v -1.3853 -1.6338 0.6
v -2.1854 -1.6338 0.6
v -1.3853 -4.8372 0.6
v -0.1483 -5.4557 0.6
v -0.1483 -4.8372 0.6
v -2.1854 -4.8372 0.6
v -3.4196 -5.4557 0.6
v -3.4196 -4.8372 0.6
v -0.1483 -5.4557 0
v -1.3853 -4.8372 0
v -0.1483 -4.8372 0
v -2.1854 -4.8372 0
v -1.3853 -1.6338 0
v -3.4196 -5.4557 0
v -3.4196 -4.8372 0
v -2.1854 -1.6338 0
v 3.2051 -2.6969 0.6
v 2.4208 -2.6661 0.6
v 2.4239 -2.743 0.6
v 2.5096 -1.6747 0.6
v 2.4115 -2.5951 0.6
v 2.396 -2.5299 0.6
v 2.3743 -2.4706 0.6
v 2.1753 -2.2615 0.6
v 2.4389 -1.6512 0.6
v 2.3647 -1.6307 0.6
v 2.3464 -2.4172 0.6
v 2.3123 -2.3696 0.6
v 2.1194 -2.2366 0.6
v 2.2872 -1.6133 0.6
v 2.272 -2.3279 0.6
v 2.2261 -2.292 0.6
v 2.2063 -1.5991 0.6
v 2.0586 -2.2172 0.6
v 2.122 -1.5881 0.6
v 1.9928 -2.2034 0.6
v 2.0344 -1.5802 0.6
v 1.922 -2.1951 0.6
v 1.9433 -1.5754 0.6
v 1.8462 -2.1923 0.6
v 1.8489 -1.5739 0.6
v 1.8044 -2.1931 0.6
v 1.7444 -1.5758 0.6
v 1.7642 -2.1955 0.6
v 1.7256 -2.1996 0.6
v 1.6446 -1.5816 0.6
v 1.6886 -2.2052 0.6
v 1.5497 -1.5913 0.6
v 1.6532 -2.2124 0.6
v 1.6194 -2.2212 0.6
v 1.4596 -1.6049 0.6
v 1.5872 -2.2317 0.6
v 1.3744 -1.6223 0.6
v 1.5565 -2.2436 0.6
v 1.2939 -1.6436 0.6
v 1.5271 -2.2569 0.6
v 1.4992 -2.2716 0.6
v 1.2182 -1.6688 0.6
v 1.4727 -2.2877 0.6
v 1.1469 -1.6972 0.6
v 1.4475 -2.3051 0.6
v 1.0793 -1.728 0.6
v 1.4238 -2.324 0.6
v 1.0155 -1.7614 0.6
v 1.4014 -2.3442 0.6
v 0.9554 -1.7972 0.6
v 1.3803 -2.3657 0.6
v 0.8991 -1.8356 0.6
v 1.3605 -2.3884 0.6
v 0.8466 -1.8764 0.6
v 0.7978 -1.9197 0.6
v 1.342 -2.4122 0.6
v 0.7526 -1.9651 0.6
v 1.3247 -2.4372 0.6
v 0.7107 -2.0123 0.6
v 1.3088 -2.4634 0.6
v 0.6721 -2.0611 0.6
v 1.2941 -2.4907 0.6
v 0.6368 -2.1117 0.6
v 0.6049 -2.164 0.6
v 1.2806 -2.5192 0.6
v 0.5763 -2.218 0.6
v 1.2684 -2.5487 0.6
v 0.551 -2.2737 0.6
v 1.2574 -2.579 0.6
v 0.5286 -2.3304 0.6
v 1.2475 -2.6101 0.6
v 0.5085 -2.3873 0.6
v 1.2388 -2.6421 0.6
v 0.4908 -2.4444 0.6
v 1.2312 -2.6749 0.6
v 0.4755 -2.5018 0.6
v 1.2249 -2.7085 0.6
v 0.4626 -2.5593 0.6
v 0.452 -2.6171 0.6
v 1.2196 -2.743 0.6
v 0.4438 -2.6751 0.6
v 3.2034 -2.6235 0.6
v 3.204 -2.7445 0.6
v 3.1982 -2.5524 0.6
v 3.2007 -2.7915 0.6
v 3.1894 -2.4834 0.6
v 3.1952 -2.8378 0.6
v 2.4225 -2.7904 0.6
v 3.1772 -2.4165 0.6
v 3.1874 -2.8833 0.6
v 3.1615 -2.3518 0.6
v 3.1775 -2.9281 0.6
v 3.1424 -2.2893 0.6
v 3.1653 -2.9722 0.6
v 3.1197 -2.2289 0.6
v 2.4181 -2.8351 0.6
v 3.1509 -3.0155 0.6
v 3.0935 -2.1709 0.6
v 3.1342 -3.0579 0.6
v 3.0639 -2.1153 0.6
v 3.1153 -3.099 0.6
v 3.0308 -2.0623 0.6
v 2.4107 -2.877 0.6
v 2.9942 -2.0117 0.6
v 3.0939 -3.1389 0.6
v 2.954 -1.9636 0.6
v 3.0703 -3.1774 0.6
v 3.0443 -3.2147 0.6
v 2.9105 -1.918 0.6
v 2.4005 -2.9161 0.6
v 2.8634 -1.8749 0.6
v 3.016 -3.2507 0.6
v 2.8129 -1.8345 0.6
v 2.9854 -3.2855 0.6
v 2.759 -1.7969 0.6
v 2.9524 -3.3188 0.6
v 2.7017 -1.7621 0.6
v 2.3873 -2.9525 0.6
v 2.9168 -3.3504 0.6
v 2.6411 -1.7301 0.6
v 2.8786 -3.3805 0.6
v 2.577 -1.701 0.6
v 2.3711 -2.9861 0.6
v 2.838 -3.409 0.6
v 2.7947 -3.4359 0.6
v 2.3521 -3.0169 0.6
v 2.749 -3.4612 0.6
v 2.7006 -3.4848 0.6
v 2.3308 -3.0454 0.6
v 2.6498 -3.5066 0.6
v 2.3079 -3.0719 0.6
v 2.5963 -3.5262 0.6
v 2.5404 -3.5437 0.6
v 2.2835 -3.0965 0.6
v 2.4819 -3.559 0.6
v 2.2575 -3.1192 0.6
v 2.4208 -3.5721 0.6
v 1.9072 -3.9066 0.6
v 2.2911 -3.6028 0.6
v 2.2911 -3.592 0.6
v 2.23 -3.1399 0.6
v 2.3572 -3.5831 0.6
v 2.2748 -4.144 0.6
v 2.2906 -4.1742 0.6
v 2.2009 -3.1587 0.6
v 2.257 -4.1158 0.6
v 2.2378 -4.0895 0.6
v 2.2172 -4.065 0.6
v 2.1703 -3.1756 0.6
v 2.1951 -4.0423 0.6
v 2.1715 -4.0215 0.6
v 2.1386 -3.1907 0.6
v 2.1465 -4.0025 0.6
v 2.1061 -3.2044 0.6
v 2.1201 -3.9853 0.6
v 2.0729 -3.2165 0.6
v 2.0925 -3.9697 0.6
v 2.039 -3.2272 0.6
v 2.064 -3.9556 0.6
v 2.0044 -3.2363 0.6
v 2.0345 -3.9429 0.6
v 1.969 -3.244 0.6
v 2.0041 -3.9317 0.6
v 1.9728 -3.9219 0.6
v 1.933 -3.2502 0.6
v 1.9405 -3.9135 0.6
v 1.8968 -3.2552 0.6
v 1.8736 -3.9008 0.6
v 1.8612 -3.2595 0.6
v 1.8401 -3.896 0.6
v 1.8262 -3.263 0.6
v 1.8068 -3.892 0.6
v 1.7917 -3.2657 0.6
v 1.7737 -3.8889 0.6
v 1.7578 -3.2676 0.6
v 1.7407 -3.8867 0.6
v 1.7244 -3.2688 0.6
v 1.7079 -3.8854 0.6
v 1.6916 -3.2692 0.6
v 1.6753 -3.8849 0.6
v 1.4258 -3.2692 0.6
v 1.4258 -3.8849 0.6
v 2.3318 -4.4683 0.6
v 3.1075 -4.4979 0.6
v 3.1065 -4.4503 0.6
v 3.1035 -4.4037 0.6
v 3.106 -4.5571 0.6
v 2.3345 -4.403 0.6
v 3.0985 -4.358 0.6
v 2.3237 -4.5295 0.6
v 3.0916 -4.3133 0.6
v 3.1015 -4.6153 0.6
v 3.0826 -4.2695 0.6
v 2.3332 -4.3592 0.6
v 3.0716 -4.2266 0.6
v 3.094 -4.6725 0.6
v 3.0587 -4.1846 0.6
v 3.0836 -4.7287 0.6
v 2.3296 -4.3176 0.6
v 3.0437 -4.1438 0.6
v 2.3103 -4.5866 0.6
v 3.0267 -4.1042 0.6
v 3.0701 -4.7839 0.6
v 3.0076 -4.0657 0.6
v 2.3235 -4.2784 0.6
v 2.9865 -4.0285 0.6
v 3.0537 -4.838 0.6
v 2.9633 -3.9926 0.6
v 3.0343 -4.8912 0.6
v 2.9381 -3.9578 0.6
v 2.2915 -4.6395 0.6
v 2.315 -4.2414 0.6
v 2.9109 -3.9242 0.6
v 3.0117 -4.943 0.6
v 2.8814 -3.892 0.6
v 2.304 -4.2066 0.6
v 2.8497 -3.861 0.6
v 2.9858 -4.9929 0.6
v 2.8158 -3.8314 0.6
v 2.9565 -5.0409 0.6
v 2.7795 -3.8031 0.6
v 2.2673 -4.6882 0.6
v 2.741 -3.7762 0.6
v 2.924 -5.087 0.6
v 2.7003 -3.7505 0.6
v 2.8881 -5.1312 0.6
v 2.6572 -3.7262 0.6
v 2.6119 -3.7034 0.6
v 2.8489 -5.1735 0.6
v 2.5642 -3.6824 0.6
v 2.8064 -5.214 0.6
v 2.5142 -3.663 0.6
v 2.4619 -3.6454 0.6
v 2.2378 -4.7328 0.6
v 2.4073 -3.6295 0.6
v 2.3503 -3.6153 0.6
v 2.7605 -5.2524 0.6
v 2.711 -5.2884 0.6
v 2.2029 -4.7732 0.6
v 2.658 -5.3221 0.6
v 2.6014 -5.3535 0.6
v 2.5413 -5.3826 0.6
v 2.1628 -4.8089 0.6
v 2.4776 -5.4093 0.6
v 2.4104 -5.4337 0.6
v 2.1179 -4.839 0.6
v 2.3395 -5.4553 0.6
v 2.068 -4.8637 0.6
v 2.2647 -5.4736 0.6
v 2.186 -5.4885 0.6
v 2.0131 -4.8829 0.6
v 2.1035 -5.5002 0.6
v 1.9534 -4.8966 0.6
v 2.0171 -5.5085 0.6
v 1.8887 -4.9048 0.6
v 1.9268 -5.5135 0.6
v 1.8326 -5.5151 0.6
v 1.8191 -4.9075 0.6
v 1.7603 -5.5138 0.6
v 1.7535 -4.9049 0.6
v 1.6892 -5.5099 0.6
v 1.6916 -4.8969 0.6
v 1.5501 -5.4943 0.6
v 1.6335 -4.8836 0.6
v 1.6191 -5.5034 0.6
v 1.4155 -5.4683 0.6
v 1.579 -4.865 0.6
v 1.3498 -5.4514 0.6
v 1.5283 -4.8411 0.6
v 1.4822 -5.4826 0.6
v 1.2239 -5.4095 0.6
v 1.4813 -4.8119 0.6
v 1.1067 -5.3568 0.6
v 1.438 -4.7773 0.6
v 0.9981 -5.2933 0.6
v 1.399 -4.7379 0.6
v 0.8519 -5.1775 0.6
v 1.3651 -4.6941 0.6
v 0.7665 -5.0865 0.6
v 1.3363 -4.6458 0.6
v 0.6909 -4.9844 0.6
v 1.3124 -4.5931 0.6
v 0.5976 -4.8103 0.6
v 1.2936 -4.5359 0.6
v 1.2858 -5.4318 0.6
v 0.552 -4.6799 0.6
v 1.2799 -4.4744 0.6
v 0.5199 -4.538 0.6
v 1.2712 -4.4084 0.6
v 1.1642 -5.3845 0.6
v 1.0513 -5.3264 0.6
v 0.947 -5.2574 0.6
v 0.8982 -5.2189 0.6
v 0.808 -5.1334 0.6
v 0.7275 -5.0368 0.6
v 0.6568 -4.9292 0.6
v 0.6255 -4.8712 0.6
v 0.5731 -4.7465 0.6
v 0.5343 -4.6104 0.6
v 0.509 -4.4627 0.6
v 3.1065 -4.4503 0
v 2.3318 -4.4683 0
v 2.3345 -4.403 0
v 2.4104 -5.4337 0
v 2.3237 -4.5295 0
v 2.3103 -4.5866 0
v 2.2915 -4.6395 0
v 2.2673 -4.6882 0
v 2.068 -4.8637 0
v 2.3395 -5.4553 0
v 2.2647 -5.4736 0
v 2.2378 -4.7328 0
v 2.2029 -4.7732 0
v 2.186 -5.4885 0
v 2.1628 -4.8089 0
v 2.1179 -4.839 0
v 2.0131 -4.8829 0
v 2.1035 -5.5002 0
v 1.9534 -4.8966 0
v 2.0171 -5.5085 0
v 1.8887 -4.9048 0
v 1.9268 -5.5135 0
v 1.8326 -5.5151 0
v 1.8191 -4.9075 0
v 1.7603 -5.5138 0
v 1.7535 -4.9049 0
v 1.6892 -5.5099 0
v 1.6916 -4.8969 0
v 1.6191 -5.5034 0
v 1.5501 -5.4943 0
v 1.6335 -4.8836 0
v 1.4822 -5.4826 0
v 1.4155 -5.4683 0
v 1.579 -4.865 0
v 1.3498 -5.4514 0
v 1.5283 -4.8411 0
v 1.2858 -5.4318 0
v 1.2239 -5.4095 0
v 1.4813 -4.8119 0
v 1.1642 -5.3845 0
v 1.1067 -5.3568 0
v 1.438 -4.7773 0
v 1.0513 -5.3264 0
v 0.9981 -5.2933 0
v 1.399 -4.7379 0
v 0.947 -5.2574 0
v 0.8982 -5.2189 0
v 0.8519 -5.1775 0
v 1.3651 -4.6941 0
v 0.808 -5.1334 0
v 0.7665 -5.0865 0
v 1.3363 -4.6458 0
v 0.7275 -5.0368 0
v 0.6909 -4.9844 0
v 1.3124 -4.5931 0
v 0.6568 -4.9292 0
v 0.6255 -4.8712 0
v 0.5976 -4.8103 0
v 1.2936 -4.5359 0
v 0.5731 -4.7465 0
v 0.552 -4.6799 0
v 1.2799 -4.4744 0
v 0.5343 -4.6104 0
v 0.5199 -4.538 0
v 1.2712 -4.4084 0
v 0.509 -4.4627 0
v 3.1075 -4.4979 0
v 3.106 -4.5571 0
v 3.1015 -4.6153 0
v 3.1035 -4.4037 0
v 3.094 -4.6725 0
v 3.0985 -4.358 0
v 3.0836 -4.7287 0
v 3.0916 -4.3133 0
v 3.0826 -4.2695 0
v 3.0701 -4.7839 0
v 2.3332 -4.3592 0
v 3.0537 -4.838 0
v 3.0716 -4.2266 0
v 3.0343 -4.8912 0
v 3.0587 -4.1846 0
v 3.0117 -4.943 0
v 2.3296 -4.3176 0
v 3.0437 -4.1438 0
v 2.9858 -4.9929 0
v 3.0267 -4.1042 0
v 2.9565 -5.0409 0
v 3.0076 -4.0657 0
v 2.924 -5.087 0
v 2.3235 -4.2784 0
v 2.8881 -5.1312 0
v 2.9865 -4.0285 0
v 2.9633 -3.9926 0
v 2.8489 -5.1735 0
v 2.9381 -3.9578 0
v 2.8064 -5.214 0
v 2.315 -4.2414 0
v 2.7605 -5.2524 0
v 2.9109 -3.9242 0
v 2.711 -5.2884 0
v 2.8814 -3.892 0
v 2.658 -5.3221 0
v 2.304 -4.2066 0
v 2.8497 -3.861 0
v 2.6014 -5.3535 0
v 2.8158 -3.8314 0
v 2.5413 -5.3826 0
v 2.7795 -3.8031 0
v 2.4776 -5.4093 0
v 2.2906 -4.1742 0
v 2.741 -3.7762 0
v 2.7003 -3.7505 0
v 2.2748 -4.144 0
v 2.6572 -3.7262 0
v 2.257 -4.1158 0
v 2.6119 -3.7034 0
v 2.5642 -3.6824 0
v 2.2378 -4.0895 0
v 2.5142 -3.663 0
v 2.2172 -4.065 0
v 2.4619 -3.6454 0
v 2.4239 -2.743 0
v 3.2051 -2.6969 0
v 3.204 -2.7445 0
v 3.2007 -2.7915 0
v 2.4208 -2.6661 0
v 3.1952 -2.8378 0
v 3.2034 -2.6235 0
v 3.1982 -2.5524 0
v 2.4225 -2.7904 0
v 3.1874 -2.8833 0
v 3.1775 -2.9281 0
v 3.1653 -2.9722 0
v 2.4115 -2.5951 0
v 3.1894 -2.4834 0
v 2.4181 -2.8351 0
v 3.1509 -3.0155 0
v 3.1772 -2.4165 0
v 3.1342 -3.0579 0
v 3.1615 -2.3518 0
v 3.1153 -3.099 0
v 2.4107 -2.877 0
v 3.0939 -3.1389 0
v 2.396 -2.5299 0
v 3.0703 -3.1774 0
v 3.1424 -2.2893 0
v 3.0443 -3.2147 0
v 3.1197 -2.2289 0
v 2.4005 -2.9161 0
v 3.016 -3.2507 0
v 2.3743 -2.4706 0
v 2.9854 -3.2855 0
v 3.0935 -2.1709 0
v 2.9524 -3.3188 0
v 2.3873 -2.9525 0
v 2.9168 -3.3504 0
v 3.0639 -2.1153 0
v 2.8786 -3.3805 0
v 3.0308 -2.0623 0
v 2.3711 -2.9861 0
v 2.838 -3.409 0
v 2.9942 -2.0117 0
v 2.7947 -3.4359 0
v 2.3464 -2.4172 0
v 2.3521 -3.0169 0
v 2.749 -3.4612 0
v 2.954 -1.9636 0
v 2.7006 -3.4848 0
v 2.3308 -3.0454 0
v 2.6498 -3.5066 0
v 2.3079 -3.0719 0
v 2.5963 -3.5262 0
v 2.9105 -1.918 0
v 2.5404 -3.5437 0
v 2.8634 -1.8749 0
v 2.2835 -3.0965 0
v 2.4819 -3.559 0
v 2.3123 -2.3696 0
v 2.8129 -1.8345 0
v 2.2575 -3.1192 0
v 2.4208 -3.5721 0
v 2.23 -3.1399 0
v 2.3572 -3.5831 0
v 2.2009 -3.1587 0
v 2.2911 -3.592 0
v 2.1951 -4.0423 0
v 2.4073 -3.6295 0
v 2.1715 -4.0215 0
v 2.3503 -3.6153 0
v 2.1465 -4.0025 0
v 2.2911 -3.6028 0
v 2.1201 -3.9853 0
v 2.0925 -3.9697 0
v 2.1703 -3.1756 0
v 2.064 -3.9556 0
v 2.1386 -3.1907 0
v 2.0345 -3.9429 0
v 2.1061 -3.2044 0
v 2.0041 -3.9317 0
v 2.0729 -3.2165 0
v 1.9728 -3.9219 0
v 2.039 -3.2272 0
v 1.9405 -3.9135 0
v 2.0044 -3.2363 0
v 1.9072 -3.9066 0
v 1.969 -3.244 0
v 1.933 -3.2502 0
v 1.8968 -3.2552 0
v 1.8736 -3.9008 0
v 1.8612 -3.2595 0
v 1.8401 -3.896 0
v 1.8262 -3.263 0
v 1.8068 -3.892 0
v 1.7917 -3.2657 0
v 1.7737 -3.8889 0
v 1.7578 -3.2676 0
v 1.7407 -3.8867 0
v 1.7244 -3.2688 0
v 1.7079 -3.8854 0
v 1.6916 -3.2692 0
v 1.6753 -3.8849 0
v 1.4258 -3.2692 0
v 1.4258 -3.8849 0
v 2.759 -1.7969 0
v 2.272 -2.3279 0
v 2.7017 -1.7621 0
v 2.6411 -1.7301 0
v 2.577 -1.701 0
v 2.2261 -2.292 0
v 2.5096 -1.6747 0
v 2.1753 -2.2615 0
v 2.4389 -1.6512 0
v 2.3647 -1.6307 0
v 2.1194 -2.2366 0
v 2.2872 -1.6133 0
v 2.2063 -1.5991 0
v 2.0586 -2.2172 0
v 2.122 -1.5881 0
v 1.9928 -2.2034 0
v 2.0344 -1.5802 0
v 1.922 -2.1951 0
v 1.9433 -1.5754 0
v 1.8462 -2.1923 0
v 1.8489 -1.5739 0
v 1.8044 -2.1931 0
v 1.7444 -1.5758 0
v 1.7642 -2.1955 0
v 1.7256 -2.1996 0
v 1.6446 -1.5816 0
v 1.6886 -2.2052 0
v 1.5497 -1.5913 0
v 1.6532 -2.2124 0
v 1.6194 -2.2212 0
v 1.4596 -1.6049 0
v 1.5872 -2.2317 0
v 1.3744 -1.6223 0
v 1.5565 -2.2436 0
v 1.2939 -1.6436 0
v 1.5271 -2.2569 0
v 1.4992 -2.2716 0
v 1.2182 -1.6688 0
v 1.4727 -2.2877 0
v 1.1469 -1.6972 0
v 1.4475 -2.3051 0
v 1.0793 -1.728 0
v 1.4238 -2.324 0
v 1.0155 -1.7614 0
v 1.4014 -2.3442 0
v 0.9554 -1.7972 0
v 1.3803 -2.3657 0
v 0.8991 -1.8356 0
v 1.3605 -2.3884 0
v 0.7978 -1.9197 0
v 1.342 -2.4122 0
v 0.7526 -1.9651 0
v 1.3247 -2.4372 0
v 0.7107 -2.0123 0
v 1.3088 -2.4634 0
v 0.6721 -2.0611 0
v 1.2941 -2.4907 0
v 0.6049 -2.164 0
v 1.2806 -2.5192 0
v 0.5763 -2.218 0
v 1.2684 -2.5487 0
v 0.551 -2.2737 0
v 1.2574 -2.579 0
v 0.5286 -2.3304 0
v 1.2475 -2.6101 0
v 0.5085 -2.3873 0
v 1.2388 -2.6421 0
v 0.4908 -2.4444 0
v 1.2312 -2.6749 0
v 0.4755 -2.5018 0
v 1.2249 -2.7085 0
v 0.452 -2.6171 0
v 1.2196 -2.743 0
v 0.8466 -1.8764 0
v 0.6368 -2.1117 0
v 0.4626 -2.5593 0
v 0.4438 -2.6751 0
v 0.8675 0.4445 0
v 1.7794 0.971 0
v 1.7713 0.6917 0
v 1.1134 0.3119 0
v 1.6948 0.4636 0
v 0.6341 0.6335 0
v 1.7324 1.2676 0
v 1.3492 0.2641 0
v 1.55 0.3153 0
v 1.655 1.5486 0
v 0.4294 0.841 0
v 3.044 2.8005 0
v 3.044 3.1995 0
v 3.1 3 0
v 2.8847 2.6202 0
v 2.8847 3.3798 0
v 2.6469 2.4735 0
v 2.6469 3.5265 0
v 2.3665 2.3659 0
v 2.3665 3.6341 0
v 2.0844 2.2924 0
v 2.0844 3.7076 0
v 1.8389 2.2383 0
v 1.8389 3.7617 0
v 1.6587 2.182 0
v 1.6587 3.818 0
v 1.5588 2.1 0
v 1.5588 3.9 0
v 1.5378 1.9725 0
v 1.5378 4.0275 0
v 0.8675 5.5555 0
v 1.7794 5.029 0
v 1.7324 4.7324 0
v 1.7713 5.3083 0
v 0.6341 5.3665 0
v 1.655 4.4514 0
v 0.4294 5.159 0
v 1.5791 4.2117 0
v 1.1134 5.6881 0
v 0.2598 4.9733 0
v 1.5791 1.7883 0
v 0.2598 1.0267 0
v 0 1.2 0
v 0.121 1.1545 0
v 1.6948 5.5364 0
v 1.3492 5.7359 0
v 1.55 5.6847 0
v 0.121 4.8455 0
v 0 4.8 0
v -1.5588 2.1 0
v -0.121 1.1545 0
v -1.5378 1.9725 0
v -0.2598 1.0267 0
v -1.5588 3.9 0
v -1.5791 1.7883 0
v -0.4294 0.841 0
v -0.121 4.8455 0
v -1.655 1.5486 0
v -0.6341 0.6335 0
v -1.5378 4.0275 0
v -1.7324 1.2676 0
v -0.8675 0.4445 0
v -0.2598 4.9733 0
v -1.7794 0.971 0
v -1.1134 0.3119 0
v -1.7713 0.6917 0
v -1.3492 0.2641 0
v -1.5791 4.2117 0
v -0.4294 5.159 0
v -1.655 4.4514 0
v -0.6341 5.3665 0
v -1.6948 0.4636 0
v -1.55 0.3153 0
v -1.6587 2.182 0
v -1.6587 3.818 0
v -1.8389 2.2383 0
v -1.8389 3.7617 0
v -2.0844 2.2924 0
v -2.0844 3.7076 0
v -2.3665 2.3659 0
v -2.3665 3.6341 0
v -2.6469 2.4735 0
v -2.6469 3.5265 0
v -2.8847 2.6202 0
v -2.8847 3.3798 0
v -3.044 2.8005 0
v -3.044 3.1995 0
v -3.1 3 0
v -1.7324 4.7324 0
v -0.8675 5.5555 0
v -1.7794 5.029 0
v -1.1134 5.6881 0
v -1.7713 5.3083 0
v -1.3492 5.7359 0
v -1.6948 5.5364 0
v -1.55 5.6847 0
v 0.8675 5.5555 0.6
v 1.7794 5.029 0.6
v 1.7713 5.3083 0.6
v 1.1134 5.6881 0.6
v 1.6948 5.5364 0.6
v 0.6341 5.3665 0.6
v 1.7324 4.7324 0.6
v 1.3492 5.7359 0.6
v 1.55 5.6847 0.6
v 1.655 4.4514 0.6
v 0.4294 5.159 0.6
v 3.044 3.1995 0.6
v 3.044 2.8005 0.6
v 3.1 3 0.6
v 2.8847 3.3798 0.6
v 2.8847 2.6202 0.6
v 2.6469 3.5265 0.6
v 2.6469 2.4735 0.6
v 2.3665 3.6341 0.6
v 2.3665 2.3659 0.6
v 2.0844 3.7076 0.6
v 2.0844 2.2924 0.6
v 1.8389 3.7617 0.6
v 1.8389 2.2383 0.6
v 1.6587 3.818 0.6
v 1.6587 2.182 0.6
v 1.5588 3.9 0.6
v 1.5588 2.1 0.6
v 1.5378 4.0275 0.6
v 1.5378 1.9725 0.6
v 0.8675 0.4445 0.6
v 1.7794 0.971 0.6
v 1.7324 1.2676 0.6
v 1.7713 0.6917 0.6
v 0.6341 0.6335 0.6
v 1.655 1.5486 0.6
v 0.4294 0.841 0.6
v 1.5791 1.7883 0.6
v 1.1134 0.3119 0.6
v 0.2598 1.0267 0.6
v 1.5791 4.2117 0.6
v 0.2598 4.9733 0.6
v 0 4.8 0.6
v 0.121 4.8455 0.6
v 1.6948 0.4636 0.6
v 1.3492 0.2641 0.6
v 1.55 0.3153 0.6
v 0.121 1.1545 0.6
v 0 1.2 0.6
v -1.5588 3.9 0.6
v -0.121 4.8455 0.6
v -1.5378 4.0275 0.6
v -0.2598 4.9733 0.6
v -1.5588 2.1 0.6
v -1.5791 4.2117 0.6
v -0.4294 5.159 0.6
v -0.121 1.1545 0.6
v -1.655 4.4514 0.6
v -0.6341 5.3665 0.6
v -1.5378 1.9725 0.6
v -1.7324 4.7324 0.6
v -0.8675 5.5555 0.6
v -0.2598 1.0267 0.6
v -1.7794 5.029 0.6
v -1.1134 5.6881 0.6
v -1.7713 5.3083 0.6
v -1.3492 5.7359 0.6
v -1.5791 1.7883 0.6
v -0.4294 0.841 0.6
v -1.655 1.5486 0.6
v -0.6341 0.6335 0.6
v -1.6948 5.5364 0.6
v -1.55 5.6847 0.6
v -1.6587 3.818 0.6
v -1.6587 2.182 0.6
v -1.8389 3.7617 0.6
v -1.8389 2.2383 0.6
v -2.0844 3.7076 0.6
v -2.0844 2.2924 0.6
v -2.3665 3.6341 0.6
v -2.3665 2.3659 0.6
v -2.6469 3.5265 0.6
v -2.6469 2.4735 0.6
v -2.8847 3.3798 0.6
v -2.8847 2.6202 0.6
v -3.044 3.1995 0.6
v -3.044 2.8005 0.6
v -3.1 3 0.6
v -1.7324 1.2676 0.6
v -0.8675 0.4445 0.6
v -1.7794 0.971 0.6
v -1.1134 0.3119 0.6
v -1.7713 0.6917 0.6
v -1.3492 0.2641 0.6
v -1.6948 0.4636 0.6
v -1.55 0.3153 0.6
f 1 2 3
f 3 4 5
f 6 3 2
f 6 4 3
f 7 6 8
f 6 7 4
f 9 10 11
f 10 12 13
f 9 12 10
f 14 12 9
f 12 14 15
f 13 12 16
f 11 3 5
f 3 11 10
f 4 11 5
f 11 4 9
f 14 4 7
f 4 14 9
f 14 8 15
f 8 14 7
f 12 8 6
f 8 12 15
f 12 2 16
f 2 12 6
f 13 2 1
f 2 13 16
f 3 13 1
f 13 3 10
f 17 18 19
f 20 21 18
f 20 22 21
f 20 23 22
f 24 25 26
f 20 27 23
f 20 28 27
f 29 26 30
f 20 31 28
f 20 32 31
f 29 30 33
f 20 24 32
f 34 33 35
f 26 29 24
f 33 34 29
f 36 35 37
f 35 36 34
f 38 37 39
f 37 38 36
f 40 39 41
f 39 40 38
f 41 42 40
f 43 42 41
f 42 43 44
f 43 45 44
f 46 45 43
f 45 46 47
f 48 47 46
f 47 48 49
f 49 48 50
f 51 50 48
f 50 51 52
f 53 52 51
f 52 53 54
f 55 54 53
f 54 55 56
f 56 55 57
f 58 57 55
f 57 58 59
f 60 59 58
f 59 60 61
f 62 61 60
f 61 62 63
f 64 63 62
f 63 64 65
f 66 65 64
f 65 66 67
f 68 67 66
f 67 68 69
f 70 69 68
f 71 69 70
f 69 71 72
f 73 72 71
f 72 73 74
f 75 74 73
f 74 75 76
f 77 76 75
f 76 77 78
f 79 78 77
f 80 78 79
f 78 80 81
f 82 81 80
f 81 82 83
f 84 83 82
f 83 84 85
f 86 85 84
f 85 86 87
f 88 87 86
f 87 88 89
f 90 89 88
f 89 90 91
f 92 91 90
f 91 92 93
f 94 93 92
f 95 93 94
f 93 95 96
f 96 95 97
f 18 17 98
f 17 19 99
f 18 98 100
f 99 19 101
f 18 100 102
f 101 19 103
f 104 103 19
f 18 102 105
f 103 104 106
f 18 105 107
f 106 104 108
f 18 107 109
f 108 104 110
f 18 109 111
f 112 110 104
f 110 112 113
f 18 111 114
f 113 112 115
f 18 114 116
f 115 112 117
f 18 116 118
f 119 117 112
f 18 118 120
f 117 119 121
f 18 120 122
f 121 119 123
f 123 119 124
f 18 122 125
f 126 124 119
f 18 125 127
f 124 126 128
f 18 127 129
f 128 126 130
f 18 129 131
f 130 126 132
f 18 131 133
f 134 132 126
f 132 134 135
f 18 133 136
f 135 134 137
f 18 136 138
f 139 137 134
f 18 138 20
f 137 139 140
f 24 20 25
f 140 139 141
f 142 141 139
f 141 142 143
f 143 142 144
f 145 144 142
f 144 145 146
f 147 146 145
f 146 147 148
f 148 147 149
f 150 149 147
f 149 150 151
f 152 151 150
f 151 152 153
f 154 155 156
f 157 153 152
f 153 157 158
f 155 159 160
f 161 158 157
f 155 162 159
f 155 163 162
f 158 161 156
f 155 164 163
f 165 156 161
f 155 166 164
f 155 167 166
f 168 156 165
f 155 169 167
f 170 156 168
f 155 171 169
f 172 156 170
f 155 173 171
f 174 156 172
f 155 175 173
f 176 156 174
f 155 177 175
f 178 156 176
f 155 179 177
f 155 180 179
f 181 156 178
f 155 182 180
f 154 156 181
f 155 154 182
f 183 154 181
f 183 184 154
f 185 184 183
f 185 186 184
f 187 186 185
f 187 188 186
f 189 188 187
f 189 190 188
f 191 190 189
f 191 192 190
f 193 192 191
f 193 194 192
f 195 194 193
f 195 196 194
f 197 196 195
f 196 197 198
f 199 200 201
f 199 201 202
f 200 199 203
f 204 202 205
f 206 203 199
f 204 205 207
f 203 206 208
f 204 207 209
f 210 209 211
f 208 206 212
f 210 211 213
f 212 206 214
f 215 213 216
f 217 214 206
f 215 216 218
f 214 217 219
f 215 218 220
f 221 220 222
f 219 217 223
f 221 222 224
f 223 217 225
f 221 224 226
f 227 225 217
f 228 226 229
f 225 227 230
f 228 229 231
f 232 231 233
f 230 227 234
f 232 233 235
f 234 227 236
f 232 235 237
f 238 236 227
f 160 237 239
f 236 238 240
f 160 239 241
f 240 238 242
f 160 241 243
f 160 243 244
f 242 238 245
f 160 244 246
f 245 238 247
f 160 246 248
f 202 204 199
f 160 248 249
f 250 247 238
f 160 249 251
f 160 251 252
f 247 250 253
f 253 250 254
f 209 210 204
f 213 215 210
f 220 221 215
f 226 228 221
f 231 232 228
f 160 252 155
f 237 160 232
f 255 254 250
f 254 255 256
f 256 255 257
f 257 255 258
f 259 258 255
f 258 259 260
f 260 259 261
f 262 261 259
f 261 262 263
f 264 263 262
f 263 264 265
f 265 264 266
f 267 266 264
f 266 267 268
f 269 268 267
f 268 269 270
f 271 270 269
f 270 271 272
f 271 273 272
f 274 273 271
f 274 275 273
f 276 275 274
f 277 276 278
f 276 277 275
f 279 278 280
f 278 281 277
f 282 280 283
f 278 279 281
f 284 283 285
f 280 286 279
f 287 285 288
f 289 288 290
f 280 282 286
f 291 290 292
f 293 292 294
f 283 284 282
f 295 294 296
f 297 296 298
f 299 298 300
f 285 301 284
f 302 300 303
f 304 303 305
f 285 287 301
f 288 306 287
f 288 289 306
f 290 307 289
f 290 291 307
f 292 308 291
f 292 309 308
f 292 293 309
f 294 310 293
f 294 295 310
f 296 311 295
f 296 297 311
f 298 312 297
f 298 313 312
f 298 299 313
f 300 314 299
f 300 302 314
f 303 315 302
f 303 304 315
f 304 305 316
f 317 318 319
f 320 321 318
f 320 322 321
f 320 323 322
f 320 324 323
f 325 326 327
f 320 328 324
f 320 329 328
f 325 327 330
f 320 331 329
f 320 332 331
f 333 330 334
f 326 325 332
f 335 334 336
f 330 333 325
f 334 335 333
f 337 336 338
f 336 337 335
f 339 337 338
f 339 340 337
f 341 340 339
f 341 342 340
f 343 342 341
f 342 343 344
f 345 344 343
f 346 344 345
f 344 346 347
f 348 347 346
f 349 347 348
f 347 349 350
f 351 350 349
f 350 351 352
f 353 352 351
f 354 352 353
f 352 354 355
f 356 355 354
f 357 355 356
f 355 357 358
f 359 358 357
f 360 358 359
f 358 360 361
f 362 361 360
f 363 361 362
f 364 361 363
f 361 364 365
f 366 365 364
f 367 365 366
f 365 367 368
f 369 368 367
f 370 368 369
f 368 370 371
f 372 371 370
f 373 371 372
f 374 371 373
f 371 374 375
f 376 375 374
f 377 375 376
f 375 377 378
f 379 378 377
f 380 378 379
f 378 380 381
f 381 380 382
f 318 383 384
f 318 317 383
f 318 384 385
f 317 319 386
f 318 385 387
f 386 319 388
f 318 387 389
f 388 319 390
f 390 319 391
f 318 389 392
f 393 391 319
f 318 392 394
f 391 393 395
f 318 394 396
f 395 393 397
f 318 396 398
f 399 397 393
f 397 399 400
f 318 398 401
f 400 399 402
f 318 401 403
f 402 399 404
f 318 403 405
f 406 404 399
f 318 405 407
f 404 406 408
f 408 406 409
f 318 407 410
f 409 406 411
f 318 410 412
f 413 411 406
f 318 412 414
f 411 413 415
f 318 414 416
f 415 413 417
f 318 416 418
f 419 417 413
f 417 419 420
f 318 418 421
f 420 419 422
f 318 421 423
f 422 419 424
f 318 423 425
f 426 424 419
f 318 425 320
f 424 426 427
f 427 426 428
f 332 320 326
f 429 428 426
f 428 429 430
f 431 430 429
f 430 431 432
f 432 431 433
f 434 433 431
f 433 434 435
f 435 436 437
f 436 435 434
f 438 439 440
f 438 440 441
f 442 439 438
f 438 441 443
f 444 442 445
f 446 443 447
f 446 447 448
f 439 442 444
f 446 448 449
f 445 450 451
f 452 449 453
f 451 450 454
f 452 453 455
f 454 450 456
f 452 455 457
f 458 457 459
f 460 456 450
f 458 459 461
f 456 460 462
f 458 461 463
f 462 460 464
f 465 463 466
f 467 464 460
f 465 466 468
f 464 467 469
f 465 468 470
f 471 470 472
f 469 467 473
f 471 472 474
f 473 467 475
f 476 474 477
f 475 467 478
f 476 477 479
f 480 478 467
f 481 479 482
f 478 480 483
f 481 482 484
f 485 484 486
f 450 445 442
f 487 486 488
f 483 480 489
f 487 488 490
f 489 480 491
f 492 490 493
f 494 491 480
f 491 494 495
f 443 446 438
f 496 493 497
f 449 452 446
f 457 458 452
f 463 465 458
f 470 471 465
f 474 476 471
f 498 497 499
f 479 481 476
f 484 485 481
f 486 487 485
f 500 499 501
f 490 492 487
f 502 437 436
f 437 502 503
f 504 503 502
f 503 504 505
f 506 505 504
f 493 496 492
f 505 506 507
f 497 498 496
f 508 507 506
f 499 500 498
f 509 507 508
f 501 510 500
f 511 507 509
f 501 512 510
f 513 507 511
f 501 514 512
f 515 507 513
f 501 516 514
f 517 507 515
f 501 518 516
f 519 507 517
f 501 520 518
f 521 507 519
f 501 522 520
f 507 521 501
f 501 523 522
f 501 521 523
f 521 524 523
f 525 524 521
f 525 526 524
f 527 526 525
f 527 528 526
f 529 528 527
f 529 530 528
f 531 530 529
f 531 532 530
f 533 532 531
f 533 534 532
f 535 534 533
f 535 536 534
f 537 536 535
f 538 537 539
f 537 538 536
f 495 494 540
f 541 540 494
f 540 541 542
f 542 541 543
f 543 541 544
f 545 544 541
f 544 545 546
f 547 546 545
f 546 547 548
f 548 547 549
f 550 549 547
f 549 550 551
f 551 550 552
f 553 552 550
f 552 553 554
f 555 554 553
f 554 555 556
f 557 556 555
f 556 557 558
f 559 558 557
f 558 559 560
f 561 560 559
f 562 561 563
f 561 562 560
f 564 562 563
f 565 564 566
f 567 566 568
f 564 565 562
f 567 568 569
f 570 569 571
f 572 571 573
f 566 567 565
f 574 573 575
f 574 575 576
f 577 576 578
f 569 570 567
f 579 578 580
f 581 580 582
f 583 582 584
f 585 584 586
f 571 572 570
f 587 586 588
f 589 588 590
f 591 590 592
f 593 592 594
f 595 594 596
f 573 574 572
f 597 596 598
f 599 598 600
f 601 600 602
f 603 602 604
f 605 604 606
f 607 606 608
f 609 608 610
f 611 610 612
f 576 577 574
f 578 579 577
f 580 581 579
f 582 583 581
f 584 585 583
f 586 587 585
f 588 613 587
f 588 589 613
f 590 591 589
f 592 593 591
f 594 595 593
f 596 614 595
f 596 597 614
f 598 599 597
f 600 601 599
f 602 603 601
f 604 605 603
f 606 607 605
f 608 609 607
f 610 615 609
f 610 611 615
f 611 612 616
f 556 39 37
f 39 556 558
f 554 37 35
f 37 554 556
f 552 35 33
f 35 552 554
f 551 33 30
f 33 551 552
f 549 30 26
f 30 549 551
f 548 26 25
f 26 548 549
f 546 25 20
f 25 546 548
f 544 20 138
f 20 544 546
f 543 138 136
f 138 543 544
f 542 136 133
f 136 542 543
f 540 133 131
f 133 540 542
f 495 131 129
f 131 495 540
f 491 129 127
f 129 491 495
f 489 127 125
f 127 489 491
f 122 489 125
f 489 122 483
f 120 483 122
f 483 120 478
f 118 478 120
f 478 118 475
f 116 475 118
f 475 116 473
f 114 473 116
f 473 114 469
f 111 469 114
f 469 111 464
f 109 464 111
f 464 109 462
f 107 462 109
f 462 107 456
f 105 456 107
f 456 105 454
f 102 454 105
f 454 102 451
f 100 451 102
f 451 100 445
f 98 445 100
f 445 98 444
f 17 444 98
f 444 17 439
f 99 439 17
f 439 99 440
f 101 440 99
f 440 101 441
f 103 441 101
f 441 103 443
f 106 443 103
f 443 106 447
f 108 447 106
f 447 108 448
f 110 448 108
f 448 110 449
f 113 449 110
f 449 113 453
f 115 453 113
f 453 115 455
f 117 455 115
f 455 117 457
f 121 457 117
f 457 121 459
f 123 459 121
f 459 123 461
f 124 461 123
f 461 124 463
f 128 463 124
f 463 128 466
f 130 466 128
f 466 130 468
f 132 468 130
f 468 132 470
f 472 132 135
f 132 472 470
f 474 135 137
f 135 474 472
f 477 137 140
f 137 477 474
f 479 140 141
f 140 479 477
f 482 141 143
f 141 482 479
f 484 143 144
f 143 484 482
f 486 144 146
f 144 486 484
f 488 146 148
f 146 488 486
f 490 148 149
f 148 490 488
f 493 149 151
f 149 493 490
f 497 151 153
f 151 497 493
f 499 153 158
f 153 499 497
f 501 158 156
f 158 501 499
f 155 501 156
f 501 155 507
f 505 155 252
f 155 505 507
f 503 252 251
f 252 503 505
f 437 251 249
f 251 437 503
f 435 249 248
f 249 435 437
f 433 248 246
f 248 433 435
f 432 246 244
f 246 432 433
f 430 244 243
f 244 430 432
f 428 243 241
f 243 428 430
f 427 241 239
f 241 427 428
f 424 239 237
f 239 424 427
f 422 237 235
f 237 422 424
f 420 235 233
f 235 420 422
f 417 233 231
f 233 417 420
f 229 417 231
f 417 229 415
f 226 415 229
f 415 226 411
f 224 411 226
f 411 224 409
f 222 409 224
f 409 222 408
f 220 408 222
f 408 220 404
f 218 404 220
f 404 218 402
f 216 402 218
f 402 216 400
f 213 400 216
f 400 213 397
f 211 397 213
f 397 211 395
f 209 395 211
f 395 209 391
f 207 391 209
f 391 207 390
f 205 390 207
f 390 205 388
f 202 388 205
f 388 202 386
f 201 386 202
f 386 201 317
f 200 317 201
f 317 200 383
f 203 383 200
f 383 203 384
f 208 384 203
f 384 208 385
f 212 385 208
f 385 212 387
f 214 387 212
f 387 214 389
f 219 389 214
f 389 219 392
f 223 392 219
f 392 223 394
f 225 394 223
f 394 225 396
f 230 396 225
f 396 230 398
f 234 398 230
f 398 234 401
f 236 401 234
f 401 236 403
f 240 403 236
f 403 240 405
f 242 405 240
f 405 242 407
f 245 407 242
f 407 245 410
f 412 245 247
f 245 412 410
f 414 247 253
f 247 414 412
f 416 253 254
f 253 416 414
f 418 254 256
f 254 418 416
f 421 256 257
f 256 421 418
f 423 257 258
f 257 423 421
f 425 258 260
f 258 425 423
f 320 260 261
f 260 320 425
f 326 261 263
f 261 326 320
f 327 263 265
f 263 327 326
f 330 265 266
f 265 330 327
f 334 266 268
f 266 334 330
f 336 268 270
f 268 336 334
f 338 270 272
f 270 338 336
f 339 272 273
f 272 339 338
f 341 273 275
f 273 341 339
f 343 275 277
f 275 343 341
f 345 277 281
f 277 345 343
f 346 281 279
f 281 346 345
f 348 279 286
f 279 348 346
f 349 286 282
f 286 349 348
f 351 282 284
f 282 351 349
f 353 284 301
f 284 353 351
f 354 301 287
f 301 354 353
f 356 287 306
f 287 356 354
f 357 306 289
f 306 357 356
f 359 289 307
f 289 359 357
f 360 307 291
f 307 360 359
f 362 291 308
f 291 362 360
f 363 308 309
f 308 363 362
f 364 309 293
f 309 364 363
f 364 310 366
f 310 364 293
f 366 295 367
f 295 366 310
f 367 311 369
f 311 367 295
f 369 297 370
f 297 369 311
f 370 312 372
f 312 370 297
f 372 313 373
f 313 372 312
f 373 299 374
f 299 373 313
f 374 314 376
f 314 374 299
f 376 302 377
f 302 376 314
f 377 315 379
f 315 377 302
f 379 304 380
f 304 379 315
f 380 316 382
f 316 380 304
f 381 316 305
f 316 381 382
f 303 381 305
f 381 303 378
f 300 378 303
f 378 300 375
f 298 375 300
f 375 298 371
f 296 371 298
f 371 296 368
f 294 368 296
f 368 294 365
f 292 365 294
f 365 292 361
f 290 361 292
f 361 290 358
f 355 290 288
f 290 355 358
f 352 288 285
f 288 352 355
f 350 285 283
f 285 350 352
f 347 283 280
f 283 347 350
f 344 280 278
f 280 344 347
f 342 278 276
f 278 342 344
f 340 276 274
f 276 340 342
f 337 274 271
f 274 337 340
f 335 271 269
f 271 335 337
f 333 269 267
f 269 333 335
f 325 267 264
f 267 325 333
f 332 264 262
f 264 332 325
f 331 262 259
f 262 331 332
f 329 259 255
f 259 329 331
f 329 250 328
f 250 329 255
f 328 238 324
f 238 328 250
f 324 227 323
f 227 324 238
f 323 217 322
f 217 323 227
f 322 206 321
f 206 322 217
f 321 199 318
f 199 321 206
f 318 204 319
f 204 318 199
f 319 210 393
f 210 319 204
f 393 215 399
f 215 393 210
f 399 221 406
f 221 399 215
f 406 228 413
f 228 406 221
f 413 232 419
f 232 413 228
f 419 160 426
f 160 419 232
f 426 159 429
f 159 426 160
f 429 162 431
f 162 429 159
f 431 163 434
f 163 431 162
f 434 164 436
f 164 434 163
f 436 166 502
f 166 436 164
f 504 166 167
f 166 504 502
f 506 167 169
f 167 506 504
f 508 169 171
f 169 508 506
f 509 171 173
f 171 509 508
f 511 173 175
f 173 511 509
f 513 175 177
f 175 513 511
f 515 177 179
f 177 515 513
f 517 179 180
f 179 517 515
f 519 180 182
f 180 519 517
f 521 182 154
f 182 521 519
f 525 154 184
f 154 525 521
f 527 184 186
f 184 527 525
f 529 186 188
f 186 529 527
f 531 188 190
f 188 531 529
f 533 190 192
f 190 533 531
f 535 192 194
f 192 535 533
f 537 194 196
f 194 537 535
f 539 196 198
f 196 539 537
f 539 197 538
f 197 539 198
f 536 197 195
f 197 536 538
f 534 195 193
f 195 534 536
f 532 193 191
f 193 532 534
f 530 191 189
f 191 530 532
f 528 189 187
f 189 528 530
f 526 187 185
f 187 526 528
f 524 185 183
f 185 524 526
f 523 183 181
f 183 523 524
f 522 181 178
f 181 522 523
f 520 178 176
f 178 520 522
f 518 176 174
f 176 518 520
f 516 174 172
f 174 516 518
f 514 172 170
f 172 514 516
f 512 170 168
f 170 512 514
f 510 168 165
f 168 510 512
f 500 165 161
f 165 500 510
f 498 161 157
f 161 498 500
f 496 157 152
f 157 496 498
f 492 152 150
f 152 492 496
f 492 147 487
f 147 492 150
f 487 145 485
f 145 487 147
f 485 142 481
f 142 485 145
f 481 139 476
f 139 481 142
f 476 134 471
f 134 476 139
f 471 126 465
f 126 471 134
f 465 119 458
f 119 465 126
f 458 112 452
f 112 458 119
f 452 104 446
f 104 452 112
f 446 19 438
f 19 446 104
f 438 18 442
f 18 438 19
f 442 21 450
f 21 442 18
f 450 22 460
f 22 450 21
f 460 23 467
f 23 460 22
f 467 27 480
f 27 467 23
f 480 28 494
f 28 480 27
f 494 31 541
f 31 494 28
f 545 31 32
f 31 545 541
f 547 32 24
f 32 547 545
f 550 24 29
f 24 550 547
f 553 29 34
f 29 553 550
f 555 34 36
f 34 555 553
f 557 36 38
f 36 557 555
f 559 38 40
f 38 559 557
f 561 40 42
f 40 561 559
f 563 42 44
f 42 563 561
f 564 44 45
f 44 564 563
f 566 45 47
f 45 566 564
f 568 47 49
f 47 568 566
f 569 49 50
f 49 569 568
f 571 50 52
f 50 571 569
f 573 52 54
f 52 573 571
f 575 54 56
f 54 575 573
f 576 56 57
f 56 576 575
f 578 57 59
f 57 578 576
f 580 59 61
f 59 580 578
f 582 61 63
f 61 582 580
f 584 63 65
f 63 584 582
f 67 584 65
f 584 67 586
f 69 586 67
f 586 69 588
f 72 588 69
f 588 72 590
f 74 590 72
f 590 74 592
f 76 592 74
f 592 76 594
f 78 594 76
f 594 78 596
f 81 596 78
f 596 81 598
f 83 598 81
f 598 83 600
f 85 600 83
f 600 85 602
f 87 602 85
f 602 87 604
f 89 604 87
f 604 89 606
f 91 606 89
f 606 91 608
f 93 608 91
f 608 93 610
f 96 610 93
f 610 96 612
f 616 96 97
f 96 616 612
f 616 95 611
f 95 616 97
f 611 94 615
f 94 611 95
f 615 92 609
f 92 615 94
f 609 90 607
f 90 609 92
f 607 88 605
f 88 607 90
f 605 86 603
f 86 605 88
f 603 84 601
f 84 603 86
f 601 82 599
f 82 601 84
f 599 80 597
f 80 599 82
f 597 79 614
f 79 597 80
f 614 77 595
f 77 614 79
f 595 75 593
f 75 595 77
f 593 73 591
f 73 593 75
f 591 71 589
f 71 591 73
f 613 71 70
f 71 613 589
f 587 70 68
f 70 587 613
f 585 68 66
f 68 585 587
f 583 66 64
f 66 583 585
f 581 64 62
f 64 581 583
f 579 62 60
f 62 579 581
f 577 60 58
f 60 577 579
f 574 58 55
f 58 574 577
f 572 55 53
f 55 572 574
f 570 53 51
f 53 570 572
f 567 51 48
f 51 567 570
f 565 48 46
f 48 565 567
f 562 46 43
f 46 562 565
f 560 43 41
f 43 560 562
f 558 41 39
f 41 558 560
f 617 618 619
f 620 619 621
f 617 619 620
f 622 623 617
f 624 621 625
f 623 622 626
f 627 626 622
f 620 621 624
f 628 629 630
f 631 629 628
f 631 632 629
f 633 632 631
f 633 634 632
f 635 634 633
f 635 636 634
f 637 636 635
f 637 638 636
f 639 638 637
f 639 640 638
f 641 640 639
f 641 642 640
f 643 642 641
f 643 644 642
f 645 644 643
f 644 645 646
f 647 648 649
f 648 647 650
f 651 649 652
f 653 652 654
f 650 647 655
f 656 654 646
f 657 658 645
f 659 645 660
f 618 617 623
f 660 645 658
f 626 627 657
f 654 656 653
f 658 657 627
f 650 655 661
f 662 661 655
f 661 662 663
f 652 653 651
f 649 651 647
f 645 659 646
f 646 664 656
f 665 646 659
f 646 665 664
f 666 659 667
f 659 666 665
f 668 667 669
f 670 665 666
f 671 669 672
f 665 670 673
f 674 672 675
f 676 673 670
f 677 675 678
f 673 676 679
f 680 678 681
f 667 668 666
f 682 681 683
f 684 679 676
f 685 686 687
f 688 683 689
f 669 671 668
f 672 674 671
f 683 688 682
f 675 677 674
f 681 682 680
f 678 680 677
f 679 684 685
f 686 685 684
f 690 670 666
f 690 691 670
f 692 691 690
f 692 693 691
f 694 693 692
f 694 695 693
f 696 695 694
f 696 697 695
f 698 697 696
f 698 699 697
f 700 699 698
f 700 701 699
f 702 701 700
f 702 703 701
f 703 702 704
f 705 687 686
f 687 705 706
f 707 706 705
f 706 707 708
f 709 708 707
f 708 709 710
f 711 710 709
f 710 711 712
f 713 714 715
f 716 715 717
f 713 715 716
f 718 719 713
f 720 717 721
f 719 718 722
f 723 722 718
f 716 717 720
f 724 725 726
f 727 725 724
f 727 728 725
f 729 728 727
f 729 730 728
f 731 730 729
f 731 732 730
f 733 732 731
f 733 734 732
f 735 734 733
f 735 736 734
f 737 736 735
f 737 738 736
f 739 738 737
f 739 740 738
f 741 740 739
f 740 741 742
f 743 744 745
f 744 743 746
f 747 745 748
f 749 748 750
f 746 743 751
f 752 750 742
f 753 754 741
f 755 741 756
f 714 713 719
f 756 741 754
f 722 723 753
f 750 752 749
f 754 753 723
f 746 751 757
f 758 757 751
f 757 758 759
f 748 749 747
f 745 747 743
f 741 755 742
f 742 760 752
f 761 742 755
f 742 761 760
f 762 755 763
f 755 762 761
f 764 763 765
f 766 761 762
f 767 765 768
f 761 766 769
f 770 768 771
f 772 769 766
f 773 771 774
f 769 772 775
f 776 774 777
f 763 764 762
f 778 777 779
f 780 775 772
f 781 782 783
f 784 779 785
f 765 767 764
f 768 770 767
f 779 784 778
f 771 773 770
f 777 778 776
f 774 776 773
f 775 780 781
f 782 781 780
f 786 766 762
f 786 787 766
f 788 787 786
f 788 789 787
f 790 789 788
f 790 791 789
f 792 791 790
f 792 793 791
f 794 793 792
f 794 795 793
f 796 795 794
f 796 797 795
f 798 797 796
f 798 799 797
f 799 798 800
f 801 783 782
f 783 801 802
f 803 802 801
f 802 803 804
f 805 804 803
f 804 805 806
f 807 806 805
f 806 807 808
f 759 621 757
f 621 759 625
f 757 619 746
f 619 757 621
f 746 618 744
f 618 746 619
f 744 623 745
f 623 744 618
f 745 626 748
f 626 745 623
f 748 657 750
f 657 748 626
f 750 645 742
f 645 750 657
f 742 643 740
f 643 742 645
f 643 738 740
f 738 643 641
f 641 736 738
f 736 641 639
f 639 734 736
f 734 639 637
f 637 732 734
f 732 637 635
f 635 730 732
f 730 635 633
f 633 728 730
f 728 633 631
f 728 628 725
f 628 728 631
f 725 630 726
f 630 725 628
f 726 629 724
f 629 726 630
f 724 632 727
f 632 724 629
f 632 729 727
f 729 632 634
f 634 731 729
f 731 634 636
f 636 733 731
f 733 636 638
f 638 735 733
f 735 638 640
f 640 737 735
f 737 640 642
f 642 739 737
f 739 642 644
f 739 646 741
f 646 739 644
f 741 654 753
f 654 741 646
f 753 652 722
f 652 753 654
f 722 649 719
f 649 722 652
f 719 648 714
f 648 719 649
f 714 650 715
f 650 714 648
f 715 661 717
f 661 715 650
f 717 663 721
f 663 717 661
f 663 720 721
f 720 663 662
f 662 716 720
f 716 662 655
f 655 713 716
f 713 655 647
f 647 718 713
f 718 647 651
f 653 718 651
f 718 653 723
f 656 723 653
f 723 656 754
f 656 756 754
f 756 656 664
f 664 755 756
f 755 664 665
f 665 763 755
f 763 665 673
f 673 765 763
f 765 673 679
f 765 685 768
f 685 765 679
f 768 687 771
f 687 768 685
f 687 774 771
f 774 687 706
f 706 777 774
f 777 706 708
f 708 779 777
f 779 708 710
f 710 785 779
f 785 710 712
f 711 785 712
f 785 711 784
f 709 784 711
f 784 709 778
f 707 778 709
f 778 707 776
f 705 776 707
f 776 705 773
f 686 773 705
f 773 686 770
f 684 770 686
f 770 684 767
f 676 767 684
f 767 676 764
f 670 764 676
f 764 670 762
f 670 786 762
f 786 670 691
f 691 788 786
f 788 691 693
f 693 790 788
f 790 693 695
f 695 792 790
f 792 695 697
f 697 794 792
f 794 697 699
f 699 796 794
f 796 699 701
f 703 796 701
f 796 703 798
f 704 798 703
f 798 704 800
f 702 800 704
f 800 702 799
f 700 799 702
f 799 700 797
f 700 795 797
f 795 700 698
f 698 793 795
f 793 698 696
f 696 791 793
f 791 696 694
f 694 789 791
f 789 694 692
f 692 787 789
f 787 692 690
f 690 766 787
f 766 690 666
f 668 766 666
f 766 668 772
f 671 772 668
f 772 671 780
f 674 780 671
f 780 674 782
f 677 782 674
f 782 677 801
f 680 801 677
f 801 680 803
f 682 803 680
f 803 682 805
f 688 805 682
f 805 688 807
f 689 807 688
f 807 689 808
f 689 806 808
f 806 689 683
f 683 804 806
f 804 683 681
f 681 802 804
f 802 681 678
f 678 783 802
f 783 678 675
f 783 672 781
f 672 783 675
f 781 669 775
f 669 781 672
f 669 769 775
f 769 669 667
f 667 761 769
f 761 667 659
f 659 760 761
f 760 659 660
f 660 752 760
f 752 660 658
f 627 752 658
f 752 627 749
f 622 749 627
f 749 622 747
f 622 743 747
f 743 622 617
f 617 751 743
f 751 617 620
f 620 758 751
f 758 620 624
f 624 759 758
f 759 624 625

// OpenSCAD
$fn = 50;

difference() {
	union() {
		translate(v = [-1.825, -3.5, 0.6]) {
			rotate(a = [180, 0, 0]) {
				linear_extrude(height = 0.6) {
					text(font = "Liberation Sans:style=Bold", halign = "center", size = 4.0, text = "T", valign = "center");
				}
			}
		}
		translate(v = [1.825, -3.5, 0.6]) {
			rotate(a = [180, 0, 0]) {
				linear_extrude(height = 0.6) {
					text(font = "Liberation Sans:style=Bold", halign = "center", size = 4.0, text = "3", valign = "center");
				}
			}
		}
		translate(v = [0, 3, 0]) {
			linear_extrude(height = 0.6) {
				polygon(points = [[3.1, 0.0], [3.0439902950186117, 0.1995136647114984], [2.8847272103883213, 0.3797815421059436], [2.646888617374527, 0.5264988810722369], [2.3665182744082176, 0.6341066605011758], [2.0844354103556904, 0.7075704773708675], [1.8388718910678303, 0.761685676746956], [1.658746676795018, 0.818003336606089], [1.55884572681199, 0.9], [1.5377850082788151, 1.0275150922444565], [1.5790750912955211, 1.211666933596394], [1.6549917135488983, 1.4513887792304347], [1.7324116139070416, 1.7324116139070416], [1.779405714759903, 2.0290233430980913], [1.7712640685463372, 2.3083562761315313], [1.6947790495515949, 2.5364160920036563], [1.5500000000000005, 2.68467875173176], [1.3492112454670173, 2.735929756715155], [1.1134631418419842, 2.688137818237475], [0.8674829026146248, 2.555522224170328], [0.6341066605011758, 2.3665182744082176], [0.42944369680679173, 2.1589592566013023], [0.2597967997723095, 1.9733526103433505], [0.120961668516203, 1.8455184288505457], [1.102182119232618e-16, 1.8000000000000003], [-0.12096166851620277, 1.8455184288505457], [-0.25979679977230924, 1.9733526103433503], [-0.42944369680679134, 2.158959256601302], [-0.6341066605011755, 2.366518274408217], [-0.8674829026146244, 2.555522224170328], [-1.1134631418419831, 2.688137818237475], [-1.3492112454670169, 2.735929756715155], [-1.5499999999999994, 2.68467875173176], [-1.6947790495515944, 2.536416092003656], [-1.7712640685463372, 2.3083562761315313], [-1.7794057147599032, 2.0290233430980913], [-1.7324116139070418, 1.732411613907042], [-1.6549917135488983, 1.4513887792304352], [-1.5790750912955214, 1.211666933596395], [-1.5377850082788156, 1.0275150922444576], [-1.55884572681199, 0.9], [-1.6587466767950174, 0.8180033366060897], [-1.8388718910678303, 0.7616856767469562], [-2.084435410355689, 0.7075704773708675], [-2.3665182744082154, 0.634106660501176], [-2.646888617374527, 0.5264988810722366], [-2.8847272103883204, 0.37978154210594467], [-3.0439902950186117, 0.1995136647114986], [-3.1, 3.796405077356795e-16], [-3.043990295018612, -0.19951366471149784], [-2.8847272103883213, -0.37978154210594417], [-2.646888617374528, -0.5264988810722362], [-2.366518274408217, -0.6341066605011759], [-2.0844354103556904, -0.7075704773708673], [-1.8388718910678312, -0.7616856767469561], [-1.6587466767950179, -0.8180033366060894], [-1.5588457268119902, -0.8999999999999996], [-1.5377850082788154, -1.0275150922444558], [-1.5790750912955211, -1.211666933596394], [-1.6549917135488978, -1.4513887792304343], [-1.7324116139070413, -1.7324116139070393], [-1.7794057147599032, -2.0290233430980904], [-1.7712640685463374, -2.30835627613153], [-1.6947790495515942, -2.5364160920036567], [-1.5500000000000014, -2.6846787517317594], [-1.349211245467018, -2.7359297567151555], [-1.1134631418419827, -2.688137818237474], [-0.8674829026146252, -2.5555222241703284], [-0.6341066605011755, -2.366518274408217], [-0.42944369680679256, -2.1589592566013027], [-0.2597967997723094, -1.973352610343351], [-0.12096166851620195, -1.8455184288505448], [-3.3065463576978537e-16, -1.8000000000000003], [0.12096166851620122, -1.8455184288505442], [0.2597967997723086, -1.9733526103433503], [0.4294436968067915, -2.1589592566013014], [0.6341066605011743, -2.3665182744082163], [0.8674829026146239, -2.5555222241703275], [1.1134631418419814, -2.688137818237473], [1.3492112454670167, -2.735929756715155], [1.5500000000000005, -2.68467875173176], [1.6947790495515938, -2.536416092003658], [1.7712640685463361, -2.3083562761315344], [1.7794057147599027, -2.0290233430980895], [1.732411613907041, -1.7324116139070416], [1.6549917135488992, -1.451388779230435], [1.5790750912955214, -1.2116669335963952], [1.5377850082788151, -1.0275150922444585], [1.5588457268119893, -0.9000000000000009], [1.658746676795018, -0.8180033366060894], [1.8388718910678303, -0.7616856767469555], [2.084435410355689, -0.7075704773708676], [2.366518274408215, -0.6341066605011774], [2.646888617374524, -0.5264988810722376], [2.8847272103883217, -0.37978154210594395], [3.0439902950186117, -0.1995136647114976]]);
			}
		}
	}
	union();
}
